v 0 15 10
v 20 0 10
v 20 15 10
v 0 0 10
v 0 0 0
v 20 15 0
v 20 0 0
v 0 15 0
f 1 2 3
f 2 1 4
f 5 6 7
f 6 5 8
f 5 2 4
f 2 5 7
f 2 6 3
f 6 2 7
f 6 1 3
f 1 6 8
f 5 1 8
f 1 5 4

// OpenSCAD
// Solid block 20 x 15 x 10 mm (X, Y, Z).
// Assumption: one corner at the origin, extending into +X, +Y, +Z.
cube([20, 15, 10]);
